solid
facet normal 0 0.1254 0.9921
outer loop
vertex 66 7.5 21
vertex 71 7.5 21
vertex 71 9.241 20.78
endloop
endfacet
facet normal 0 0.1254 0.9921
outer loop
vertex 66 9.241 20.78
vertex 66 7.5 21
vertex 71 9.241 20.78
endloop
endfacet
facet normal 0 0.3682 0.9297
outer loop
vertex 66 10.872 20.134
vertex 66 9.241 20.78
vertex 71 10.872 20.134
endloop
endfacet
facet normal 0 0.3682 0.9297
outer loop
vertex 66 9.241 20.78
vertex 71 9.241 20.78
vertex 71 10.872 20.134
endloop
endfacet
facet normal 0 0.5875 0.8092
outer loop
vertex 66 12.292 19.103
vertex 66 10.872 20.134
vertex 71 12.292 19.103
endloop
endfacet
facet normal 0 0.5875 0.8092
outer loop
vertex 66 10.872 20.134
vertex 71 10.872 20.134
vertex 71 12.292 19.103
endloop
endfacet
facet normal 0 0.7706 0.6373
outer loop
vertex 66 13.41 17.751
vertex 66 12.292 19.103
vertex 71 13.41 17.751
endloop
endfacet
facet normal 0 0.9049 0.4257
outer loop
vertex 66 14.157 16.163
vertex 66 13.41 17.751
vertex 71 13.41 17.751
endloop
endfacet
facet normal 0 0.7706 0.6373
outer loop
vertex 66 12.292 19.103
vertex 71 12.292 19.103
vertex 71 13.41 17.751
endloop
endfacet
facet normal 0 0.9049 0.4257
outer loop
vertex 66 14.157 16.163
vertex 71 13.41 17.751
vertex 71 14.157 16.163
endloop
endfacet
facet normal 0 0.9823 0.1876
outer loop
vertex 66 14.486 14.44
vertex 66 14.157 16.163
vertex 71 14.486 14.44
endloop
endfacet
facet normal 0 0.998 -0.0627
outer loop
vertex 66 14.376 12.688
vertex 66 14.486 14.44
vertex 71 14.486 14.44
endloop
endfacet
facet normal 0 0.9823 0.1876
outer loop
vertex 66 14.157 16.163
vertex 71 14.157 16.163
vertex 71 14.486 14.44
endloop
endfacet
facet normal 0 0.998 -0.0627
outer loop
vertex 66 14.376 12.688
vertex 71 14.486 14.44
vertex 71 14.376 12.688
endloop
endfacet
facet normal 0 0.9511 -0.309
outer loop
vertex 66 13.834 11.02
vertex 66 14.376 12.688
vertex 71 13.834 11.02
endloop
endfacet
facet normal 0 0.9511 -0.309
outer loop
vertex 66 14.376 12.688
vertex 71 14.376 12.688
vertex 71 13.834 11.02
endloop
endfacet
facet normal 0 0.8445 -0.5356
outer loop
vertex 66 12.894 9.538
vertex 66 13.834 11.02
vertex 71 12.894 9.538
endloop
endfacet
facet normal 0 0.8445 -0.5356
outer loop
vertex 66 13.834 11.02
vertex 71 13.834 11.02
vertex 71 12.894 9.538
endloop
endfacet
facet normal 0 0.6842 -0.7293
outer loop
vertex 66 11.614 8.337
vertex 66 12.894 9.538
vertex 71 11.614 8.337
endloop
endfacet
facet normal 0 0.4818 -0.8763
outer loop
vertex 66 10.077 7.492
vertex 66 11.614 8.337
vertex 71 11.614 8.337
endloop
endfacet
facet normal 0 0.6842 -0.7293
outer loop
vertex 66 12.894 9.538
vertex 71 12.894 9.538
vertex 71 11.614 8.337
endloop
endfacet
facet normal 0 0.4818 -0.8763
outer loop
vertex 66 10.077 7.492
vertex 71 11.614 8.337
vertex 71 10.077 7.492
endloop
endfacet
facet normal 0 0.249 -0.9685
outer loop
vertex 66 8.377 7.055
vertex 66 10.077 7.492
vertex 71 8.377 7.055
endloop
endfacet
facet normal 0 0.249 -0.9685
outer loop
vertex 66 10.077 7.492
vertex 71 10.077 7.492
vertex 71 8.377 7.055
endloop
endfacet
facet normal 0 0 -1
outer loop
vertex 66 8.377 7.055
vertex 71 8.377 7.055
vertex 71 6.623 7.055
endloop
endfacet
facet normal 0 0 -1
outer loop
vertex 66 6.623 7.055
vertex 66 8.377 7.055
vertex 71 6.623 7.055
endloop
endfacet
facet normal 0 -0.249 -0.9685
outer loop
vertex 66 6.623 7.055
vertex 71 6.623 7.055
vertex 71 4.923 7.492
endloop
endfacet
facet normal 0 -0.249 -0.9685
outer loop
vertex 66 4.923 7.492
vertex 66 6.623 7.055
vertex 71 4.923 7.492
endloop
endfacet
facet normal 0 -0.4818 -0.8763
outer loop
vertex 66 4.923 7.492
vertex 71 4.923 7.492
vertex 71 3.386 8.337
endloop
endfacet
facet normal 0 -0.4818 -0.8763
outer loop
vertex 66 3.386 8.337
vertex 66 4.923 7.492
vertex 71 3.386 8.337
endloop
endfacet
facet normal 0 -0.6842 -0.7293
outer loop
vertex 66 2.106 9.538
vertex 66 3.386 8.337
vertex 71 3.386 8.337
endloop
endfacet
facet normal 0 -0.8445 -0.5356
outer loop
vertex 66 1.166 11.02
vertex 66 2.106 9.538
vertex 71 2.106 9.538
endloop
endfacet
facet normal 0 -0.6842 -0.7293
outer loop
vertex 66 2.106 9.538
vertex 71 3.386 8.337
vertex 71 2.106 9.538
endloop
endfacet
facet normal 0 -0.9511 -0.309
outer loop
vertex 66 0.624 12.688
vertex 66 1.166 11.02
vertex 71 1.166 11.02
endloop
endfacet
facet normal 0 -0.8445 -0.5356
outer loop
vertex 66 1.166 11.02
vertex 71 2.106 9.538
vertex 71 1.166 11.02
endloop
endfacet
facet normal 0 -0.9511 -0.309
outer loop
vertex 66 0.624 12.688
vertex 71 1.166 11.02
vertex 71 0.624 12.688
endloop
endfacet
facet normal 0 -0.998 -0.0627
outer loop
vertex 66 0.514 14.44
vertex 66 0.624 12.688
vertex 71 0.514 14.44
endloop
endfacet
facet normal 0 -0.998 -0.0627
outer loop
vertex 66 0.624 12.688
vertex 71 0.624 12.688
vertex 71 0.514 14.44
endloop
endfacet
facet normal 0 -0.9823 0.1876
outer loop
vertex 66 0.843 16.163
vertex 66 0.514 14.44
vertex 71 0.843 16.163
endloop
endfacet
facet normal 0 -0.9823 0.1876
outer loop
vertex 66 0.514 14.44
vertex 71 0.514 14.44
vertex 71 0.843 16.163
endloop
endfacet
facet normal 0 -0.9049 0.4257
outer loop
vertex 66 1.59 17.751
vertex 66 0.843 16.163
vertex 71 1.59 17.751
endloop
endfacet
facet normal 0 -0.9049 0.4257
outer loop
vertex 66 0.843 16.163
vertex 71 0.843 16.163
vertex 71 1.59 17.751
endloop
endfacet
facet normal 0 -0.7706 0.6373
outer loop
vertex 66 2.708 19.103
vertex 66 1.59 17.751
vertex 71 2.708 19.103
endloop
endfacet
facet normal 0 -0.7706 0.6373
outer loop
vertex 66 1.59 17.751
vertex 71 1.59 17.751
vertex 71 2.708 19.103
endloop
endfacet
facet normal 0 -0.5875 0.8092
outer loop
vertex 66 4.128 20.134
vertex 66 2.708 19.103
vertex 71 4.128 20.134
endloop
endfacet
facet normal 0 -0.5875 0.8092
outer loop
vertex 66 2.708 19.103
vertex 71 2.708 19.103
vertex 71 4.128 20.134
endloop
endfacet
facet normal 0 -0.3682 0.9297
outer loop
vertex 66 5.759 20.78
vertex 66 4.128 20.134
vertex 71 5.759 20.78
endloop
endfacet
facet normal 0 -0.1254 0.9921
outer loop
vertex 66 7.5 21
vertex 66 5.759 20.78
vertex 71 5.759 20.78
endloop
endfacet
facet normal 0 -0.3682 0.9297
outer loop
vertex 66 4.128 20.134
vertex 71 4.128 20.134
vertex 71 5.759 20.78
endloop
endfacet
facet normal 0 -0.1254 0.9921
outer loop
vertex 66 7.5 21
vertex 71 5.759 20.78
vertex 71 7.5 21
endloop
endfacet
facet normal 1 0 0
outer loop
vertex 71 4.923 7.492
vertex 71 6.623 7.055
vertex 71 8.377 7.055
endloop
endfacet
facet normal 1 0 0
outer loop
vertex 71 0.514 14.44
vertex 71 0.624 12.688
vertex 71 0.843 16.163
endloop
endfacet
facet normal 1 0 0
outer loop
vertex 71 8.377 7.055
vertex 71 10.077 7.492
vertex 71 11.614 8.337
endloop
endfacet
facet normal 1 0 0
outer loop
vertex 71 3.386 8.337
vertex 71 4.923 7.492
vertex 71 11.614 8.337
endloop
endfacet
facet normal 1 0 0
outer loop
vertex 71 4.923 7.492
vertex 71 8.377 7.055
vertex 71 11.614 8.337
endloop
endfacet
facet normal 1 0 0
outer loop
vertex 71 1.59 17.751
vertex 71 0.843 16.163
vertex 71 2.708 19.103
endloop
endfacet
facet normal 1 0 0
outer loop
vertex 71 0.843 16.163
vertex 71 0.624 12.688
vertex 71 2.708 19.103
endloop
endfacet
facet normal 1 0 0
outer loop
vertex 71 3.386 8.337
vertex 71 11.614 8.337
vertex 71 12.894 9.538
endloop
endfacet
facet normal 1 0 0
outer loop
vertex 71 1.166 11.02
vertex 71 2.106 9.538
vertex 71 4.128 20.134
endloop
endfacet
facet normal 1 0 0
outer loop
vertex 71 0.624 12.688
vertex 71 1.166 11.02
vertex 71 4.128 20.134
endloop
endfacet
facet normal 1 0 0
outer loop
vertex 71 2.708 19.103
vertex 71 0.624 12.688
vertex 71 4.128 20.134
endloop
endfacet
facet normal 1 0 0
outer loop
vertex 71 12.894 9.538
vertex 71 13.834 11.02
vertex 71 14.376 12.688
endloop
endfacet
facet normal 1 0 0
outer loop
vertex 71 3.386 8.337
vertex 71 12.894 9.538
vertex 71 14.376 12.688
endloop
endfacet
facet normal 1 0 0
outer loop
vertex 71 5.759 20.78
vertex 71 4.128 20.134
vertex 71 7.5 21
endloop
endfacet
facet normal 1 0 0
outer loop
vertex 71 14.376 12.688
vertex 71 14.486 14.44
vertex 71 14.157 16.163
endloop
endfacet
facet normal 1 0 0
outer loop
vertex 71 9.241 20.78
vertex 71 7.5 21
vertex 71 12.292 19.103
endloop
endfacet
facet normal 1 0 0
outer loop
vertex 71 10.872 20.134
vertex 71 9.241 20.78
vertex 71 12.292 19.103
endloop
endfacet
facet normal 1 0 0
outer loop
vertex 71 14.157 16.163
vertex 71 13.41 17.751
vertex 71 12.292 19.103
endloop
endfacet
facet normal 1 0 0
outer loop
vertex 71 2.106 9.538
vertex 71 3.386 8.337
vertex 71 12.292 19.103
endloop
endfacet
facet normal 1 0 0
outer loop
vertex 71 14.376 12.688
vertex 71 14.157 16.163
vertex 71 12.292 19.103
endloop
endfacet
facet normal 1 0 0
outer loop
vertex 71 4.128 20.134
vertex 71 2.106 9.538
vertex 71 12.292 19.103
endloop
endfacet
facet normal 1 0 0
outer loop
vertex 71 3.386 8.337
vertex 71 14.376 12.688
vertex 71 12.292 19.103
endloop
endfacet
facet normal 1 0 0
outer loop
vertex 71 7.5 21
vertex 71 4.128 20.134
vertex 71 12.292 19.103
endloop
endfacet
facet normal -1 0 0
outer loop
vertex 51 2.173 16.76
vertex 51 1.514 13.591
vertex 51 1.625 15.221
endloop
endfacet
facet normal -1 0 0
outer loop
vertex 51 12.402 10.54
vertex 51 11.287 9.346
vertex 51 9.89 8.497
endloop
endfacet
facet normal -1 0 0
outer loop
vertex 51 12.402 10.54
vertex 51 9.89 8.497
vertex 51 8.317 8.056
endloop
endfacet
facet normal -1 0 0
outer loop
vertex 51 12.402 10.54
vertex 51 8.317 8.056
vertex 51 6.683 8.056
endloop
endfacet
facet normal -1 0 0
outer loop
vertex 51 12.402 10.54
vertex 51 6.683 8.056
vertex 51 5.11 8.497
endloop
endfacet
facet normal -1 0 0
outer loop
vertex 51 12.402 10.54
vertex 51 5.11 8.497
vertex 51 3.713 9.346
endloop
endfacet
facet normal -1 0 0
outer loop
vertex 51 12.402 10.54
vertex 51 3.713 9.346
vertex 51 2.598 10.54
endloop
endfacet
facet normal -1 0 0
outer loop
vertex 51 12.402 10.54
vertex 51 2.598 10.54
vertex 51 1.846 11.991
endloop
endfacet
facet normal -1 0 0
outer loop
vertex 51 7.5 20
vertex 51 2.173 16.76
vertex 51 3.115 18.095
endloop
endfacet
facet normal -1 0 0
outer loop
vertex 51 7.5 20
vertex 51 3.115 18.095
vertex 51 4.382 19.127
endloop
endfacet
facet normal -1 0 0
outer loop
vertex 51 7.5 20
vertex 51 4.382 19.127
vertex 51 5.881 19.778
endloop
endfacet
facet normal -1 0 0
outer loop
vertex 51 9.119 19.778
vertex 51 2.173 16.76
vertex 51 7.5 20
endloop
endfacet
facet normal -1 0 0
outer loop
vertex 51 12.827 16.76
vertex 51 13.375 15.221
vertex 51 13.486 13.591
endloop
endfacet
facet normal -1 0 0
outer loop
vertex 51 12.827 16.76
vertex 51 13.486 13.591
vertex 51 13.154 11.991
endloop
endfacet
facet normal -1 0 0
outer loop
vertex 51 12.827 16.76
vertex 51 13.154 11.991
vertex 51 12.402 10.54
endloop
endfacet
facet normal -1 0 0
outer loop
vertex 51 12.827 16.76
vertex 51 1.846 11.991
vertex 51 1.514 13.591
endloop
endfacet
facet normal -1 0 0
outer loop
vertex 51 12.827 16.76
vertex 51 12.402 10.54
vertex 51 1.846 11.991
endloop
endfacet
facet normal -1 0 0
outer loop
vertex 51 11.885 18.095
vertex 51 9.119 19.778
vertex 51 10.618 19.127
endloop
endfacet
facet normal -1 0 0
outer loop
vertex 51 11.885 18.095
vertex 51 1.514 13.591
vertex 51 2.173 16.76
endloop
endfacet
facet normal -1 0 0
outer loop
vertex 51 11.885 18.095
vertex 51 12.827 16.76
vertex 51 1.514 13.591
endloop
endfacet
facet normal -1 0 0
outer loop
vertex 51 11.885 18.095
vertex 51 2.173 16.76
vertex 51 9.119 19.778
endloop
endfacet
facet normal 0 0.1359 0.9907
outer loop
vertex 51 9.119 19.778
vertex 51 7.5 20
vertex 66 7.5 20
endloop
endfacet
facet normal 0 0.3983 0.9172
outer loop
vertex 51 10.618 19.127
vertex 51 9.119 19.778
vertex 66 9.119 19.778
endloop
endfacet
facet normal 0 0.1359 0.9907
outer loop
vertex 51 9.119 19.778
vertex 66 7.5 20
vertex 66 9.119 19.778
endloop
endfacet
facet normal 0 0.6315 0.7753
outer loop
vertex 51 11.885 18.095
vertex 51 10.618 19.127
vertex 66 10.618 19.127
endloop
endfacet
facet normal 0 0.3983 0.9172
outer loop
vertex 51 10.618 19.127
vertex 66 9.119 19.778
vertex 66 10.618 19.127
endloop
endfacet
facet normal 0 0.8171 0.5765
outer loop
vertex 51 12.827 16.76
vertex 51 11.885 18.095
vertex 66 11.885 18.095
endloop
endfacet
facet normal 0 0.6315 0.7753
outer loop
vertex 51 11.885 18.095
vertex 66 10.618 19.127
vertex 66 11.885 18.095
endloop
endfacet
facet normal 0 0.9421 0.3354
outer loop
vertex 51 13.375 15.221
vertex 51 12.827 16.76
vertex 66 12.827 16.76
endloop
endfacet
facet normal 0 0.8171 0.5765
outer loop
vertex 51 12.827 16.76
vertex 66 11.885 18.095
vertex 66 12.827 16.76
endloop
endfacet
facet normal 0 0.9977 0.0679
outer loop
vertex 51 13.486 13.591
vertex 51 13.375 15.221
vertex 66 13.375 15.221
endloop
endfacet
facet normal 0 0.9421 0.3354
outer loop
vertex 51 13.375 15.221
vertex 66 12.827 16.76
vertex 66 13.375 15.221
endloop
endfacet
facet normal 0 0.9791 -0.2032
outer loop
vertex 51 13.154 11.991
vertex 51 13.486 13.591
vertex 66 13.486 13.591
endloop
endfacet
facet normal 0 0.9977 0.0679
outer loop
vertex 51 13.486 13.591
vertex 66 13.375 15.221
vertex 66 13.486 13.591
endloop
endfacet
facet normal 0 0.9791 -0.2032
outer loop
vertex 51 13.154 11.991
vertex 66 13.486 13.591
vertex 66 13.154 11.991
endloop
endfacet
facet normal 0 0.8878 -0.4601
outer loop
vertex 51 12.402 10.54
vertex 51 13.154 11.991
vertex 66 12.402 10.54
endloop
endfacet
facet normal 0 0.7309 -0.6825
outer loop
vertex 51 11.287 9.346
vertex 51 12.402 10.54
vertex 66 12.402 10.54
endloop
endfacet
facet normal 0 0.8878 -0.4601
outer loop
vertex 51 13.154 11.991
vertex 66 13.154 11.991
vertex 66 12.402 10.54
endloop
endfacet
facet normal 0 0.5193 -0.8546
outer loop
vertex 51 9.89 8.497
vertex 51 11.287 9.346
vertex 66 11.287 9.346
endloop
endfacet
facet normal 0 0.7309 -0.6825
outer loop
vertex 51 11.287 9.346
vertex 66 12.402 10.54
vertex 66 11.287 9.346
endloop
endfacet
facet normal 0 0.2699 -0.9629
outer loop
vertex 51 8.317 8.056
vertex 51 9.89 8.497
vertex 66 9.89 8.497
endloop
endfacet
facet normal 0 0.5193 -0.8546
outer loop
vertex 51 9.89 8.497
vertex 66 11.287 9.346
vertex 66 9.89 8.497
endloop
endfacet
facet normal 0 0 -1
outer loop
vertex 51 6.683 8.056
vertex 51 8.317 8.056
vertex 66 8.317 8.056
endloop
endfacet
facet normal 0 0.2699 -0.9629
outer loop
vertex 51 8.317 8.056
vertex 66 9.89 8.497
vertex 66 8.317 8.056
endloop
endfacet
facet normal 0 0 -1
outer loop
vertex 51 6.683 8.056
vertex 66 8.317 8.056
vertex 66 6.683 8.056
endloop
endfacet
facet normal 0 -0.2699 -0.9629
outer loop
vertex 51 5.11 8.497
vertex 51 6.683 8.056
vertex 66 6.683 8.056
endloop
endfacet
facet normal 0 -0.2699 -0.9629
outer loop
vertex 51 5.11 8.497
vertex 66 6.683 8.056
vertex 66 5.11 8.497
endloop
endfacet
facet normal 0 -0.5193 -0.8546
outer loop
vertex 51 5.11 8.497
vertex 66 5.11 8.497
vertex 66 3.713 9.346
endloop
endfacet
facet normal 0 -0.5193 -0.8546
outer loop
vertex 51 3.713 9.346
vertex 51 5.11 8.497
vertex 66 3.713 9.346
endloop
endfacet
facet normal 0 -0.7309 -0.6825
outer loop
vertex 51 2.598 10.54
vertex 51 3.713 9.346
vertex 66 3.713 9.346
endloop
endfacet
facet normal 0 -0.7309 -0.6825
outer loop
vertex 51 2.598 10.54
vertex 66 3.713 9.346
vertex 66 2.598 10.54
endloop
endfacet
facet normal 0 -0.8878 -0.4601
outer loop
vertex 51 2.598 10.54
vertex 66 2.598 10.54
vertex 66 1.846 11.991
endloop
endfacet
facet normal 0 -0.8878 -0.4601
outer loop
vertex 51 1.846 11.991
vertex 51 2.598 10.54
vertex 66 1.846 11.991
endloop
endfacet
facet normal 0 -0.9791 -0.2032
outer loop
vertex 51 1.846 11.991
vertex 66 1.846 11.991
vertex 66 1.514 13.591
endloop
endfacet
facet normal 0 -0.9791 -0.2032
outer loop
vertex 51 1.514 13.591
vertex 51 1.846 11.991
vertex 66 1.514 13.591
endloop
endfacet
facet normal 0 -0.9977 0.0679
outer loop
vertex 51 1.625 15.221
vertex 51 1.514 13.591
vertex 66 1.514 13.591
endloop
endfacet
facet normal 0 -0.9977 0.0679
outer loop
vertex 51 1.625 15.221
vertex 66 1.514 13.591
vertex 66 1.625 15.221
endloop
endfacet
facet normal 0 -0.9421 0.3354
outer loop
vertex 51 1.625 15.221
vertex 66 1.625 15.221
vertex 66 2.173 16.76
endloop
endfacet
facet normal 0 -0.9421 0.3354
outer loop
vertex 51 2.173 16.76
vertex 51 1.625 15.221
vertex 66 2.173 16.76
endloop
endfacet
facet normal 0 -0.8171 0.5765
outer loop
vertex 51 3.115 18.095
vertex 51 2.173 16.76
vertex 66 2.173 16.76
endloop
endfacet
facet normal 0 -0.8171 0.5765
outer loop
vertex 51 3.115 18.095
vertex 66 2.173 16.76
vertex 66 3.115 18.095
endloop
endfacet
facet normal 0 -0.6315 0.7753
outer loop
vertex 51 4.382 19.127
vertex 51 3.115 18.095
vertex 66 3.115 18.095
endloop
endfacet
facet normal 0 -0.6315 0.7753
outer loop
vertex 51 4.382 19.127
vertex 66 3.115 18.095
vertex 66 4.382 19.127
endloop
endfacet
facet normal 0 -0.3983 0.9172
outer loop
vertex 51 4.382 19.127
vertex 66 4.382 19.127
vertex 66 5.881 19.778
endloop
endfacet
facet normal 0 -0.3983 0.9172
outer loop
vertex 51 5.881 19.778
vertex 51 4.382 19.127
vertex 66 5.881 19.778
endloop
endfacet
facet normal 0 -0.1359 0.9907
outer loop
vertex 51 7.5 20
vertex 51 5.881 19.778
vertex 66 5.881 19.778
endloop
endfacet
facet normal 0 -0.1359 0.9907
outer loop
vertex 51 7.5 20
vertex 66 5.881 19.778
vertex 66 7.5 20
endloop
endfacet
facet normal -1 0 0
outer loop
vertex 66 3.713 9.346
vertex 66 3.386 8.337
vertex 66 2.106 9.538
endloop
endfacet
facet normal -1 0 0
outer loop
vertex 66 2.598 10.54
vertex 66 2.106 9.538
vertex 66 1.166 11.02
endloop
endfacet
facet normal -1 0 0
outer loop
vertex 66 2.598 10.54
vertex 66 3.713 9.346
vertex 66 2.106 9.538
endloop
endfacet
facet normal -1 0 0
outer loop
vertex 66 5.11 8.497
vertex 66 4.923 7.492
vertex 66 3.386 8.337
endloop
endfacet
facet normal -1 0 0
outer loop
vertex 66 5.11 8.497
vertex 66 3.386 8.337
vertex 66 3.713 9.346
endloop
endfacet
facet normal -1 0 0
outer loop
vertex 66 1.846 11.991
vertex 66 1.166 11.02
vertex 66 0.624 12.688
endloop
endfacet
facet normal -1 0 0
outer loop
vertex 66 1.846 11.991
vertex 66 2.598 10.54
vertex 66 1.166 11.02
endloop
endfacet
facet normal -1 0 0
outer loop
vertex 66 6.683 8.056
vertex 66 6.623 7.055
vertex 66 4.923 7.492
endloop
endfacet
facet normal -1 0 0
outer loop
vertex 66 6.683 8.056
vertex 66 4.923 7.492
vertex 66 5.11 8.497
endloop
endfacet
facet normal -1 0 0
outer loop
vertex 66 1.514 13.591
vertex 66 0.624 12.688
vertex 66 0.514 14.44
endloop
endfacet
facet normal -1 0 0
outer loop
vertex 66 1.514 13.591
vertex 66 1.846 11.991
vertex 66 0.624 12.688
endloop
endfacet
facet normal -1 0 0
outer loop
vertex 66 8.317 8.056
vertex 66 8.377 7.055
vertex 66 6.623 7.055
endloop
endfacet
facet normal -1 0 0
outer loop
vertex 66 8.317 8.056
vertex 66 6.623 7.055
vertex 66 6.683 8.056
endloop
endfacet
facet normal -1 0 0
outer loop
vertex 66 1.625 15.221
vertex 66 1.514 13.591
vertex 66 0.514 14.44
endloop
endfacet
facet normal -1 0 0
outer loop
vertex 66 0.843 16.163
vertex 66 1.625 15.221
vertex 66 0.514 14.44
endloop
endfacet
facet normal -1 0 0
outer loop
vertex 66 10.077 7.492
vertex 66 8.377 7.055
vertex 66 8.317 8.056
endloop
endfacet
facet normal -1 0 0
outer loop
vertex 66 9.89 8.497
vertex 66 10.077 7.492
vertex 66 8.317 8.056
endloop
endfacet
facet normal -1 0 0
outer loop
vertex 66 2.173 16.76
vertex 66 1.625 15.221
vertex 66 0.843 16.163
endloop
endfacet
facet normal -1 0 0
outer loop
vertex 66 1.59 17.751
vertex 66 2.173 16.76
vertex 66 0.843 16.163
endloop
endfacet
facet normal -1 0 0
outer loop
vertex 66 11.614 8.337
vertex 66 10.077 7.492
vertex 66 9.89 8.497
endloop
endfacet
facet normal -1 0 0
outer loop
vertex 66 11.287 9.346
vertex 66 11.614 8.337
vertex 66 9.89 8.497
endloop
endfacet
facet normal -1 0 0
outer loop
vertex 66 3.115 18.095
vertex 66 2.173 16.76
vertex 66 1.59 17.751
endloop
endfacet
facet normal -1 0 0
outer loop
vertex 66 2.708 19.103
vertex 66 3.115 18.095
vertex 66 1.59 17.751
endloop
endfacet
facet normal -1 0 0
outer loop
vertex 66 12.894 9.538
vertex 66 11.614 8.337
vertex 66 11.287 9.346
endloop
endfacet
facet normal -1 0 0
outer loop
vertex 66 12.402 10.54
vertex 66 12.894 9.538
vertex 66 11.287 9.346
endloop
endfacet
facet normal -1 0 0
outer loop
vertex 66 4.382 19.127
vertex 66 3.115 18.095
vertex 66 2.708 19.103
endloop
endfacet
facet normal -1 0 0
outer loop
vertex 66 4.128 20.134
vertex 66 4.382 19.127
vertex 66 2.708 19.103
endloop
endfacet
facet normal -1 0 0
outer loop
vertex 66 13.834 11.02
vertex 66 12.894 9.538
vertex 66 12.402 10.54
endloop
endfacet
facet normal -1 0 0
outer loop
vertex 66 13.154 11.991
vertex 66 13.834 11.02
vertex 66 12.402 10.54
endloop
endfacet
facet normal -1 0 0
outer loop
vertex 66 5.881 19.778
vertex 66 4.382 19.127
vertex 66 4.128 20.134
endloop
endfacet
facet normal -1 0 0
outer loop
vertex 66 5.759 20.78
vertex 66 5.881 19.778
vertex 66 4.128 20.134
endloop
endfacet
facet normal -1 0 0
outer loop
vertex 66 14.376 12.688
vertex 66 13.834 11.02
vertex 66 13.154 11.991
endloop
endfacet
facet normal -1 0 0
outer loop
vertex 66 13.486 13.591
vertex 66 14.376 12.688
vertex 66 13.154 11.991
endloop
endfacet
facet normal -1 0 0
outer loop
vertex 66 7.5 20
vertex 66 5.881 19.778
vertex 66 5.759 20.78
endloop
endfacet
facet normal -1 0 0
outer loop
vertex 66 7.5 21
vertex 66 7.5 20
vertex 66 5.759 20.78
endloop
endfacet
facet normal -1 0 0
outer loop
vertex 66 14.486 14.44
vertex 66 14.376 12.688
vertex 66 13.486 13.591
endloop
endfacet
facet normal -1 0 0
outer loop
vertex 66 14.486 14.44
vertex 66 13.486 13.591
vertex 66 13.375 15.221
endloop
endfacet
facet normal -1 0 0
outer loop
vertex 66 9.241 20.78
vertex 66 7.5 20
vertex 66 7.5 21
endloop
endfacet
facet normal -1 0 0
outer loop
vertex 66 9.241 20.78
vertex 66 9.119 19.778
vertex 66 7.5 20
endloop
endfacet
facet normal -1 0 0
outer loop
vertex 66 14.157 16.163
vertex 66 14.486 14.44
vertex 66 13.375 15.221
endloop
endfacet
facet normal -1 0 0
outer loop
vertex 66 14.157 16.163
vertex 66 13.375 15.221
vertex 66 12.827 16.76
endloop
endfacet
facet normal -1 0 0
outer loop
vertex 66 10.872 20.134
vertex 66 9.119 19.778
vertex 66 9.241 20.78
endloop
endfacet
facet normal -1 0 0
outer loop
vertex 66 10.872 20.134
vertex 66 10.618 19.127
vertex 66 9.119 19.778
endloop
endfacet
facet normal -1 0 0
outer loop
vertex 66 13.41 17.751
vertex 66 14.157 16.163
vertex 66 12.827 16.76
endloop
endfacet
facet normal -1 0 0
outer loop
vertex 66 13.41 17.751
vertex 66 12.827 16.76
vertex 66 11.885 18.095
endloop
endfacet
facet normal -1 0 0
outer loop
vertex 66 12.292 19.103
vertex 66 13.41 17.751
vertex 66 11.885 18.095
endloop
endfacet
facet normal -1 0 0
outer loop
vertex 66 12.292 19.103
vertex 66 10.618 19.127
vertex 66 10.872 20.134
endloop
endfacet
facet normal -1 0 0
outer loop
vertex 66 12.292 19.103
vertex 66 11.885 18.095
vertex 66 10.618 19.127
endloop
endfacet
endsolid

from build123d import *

# Parameters (mm, degrees)
CYLINDER071_R             = 7
CYLINDER071_DEPTH         = 5
CYLINDER070_R             = 6
CYLINDER070_DEPTH         = 20
FUSION022_PLACEMENT_ANGLE = 90


with BuildPart() as cylinder071:
    # Cylinder071 → Cylinder071 (new body)
    with BuildSketch(Plane.XY):
        Circle(CYLINDER071_R)
    extrude(amount=CYLINDER071_DEPTH)


with BuildPart() as powerswitch001:
    # Cylinder070 → Cylinder070 (new body)
    with BuildSketch(Plane.XY):
        Circle(CYLINDER070_R)
    extrude(amount=CYLINDER070_DEPTH)

    # Fusion022: union Cylinder071
    add(cylinder071.part)


with BuildPart() as powerswitch001_1:
    # Fusion022 placement: moved
    add(powerswitch001.part.moved(Location((71, 7.5, 14))).rotate(Axis((71, 7.5, 14), (0, -1, 0)), FUSION022_PLACEMENT_ANGLE))


solid = powerswitch001_1.part
